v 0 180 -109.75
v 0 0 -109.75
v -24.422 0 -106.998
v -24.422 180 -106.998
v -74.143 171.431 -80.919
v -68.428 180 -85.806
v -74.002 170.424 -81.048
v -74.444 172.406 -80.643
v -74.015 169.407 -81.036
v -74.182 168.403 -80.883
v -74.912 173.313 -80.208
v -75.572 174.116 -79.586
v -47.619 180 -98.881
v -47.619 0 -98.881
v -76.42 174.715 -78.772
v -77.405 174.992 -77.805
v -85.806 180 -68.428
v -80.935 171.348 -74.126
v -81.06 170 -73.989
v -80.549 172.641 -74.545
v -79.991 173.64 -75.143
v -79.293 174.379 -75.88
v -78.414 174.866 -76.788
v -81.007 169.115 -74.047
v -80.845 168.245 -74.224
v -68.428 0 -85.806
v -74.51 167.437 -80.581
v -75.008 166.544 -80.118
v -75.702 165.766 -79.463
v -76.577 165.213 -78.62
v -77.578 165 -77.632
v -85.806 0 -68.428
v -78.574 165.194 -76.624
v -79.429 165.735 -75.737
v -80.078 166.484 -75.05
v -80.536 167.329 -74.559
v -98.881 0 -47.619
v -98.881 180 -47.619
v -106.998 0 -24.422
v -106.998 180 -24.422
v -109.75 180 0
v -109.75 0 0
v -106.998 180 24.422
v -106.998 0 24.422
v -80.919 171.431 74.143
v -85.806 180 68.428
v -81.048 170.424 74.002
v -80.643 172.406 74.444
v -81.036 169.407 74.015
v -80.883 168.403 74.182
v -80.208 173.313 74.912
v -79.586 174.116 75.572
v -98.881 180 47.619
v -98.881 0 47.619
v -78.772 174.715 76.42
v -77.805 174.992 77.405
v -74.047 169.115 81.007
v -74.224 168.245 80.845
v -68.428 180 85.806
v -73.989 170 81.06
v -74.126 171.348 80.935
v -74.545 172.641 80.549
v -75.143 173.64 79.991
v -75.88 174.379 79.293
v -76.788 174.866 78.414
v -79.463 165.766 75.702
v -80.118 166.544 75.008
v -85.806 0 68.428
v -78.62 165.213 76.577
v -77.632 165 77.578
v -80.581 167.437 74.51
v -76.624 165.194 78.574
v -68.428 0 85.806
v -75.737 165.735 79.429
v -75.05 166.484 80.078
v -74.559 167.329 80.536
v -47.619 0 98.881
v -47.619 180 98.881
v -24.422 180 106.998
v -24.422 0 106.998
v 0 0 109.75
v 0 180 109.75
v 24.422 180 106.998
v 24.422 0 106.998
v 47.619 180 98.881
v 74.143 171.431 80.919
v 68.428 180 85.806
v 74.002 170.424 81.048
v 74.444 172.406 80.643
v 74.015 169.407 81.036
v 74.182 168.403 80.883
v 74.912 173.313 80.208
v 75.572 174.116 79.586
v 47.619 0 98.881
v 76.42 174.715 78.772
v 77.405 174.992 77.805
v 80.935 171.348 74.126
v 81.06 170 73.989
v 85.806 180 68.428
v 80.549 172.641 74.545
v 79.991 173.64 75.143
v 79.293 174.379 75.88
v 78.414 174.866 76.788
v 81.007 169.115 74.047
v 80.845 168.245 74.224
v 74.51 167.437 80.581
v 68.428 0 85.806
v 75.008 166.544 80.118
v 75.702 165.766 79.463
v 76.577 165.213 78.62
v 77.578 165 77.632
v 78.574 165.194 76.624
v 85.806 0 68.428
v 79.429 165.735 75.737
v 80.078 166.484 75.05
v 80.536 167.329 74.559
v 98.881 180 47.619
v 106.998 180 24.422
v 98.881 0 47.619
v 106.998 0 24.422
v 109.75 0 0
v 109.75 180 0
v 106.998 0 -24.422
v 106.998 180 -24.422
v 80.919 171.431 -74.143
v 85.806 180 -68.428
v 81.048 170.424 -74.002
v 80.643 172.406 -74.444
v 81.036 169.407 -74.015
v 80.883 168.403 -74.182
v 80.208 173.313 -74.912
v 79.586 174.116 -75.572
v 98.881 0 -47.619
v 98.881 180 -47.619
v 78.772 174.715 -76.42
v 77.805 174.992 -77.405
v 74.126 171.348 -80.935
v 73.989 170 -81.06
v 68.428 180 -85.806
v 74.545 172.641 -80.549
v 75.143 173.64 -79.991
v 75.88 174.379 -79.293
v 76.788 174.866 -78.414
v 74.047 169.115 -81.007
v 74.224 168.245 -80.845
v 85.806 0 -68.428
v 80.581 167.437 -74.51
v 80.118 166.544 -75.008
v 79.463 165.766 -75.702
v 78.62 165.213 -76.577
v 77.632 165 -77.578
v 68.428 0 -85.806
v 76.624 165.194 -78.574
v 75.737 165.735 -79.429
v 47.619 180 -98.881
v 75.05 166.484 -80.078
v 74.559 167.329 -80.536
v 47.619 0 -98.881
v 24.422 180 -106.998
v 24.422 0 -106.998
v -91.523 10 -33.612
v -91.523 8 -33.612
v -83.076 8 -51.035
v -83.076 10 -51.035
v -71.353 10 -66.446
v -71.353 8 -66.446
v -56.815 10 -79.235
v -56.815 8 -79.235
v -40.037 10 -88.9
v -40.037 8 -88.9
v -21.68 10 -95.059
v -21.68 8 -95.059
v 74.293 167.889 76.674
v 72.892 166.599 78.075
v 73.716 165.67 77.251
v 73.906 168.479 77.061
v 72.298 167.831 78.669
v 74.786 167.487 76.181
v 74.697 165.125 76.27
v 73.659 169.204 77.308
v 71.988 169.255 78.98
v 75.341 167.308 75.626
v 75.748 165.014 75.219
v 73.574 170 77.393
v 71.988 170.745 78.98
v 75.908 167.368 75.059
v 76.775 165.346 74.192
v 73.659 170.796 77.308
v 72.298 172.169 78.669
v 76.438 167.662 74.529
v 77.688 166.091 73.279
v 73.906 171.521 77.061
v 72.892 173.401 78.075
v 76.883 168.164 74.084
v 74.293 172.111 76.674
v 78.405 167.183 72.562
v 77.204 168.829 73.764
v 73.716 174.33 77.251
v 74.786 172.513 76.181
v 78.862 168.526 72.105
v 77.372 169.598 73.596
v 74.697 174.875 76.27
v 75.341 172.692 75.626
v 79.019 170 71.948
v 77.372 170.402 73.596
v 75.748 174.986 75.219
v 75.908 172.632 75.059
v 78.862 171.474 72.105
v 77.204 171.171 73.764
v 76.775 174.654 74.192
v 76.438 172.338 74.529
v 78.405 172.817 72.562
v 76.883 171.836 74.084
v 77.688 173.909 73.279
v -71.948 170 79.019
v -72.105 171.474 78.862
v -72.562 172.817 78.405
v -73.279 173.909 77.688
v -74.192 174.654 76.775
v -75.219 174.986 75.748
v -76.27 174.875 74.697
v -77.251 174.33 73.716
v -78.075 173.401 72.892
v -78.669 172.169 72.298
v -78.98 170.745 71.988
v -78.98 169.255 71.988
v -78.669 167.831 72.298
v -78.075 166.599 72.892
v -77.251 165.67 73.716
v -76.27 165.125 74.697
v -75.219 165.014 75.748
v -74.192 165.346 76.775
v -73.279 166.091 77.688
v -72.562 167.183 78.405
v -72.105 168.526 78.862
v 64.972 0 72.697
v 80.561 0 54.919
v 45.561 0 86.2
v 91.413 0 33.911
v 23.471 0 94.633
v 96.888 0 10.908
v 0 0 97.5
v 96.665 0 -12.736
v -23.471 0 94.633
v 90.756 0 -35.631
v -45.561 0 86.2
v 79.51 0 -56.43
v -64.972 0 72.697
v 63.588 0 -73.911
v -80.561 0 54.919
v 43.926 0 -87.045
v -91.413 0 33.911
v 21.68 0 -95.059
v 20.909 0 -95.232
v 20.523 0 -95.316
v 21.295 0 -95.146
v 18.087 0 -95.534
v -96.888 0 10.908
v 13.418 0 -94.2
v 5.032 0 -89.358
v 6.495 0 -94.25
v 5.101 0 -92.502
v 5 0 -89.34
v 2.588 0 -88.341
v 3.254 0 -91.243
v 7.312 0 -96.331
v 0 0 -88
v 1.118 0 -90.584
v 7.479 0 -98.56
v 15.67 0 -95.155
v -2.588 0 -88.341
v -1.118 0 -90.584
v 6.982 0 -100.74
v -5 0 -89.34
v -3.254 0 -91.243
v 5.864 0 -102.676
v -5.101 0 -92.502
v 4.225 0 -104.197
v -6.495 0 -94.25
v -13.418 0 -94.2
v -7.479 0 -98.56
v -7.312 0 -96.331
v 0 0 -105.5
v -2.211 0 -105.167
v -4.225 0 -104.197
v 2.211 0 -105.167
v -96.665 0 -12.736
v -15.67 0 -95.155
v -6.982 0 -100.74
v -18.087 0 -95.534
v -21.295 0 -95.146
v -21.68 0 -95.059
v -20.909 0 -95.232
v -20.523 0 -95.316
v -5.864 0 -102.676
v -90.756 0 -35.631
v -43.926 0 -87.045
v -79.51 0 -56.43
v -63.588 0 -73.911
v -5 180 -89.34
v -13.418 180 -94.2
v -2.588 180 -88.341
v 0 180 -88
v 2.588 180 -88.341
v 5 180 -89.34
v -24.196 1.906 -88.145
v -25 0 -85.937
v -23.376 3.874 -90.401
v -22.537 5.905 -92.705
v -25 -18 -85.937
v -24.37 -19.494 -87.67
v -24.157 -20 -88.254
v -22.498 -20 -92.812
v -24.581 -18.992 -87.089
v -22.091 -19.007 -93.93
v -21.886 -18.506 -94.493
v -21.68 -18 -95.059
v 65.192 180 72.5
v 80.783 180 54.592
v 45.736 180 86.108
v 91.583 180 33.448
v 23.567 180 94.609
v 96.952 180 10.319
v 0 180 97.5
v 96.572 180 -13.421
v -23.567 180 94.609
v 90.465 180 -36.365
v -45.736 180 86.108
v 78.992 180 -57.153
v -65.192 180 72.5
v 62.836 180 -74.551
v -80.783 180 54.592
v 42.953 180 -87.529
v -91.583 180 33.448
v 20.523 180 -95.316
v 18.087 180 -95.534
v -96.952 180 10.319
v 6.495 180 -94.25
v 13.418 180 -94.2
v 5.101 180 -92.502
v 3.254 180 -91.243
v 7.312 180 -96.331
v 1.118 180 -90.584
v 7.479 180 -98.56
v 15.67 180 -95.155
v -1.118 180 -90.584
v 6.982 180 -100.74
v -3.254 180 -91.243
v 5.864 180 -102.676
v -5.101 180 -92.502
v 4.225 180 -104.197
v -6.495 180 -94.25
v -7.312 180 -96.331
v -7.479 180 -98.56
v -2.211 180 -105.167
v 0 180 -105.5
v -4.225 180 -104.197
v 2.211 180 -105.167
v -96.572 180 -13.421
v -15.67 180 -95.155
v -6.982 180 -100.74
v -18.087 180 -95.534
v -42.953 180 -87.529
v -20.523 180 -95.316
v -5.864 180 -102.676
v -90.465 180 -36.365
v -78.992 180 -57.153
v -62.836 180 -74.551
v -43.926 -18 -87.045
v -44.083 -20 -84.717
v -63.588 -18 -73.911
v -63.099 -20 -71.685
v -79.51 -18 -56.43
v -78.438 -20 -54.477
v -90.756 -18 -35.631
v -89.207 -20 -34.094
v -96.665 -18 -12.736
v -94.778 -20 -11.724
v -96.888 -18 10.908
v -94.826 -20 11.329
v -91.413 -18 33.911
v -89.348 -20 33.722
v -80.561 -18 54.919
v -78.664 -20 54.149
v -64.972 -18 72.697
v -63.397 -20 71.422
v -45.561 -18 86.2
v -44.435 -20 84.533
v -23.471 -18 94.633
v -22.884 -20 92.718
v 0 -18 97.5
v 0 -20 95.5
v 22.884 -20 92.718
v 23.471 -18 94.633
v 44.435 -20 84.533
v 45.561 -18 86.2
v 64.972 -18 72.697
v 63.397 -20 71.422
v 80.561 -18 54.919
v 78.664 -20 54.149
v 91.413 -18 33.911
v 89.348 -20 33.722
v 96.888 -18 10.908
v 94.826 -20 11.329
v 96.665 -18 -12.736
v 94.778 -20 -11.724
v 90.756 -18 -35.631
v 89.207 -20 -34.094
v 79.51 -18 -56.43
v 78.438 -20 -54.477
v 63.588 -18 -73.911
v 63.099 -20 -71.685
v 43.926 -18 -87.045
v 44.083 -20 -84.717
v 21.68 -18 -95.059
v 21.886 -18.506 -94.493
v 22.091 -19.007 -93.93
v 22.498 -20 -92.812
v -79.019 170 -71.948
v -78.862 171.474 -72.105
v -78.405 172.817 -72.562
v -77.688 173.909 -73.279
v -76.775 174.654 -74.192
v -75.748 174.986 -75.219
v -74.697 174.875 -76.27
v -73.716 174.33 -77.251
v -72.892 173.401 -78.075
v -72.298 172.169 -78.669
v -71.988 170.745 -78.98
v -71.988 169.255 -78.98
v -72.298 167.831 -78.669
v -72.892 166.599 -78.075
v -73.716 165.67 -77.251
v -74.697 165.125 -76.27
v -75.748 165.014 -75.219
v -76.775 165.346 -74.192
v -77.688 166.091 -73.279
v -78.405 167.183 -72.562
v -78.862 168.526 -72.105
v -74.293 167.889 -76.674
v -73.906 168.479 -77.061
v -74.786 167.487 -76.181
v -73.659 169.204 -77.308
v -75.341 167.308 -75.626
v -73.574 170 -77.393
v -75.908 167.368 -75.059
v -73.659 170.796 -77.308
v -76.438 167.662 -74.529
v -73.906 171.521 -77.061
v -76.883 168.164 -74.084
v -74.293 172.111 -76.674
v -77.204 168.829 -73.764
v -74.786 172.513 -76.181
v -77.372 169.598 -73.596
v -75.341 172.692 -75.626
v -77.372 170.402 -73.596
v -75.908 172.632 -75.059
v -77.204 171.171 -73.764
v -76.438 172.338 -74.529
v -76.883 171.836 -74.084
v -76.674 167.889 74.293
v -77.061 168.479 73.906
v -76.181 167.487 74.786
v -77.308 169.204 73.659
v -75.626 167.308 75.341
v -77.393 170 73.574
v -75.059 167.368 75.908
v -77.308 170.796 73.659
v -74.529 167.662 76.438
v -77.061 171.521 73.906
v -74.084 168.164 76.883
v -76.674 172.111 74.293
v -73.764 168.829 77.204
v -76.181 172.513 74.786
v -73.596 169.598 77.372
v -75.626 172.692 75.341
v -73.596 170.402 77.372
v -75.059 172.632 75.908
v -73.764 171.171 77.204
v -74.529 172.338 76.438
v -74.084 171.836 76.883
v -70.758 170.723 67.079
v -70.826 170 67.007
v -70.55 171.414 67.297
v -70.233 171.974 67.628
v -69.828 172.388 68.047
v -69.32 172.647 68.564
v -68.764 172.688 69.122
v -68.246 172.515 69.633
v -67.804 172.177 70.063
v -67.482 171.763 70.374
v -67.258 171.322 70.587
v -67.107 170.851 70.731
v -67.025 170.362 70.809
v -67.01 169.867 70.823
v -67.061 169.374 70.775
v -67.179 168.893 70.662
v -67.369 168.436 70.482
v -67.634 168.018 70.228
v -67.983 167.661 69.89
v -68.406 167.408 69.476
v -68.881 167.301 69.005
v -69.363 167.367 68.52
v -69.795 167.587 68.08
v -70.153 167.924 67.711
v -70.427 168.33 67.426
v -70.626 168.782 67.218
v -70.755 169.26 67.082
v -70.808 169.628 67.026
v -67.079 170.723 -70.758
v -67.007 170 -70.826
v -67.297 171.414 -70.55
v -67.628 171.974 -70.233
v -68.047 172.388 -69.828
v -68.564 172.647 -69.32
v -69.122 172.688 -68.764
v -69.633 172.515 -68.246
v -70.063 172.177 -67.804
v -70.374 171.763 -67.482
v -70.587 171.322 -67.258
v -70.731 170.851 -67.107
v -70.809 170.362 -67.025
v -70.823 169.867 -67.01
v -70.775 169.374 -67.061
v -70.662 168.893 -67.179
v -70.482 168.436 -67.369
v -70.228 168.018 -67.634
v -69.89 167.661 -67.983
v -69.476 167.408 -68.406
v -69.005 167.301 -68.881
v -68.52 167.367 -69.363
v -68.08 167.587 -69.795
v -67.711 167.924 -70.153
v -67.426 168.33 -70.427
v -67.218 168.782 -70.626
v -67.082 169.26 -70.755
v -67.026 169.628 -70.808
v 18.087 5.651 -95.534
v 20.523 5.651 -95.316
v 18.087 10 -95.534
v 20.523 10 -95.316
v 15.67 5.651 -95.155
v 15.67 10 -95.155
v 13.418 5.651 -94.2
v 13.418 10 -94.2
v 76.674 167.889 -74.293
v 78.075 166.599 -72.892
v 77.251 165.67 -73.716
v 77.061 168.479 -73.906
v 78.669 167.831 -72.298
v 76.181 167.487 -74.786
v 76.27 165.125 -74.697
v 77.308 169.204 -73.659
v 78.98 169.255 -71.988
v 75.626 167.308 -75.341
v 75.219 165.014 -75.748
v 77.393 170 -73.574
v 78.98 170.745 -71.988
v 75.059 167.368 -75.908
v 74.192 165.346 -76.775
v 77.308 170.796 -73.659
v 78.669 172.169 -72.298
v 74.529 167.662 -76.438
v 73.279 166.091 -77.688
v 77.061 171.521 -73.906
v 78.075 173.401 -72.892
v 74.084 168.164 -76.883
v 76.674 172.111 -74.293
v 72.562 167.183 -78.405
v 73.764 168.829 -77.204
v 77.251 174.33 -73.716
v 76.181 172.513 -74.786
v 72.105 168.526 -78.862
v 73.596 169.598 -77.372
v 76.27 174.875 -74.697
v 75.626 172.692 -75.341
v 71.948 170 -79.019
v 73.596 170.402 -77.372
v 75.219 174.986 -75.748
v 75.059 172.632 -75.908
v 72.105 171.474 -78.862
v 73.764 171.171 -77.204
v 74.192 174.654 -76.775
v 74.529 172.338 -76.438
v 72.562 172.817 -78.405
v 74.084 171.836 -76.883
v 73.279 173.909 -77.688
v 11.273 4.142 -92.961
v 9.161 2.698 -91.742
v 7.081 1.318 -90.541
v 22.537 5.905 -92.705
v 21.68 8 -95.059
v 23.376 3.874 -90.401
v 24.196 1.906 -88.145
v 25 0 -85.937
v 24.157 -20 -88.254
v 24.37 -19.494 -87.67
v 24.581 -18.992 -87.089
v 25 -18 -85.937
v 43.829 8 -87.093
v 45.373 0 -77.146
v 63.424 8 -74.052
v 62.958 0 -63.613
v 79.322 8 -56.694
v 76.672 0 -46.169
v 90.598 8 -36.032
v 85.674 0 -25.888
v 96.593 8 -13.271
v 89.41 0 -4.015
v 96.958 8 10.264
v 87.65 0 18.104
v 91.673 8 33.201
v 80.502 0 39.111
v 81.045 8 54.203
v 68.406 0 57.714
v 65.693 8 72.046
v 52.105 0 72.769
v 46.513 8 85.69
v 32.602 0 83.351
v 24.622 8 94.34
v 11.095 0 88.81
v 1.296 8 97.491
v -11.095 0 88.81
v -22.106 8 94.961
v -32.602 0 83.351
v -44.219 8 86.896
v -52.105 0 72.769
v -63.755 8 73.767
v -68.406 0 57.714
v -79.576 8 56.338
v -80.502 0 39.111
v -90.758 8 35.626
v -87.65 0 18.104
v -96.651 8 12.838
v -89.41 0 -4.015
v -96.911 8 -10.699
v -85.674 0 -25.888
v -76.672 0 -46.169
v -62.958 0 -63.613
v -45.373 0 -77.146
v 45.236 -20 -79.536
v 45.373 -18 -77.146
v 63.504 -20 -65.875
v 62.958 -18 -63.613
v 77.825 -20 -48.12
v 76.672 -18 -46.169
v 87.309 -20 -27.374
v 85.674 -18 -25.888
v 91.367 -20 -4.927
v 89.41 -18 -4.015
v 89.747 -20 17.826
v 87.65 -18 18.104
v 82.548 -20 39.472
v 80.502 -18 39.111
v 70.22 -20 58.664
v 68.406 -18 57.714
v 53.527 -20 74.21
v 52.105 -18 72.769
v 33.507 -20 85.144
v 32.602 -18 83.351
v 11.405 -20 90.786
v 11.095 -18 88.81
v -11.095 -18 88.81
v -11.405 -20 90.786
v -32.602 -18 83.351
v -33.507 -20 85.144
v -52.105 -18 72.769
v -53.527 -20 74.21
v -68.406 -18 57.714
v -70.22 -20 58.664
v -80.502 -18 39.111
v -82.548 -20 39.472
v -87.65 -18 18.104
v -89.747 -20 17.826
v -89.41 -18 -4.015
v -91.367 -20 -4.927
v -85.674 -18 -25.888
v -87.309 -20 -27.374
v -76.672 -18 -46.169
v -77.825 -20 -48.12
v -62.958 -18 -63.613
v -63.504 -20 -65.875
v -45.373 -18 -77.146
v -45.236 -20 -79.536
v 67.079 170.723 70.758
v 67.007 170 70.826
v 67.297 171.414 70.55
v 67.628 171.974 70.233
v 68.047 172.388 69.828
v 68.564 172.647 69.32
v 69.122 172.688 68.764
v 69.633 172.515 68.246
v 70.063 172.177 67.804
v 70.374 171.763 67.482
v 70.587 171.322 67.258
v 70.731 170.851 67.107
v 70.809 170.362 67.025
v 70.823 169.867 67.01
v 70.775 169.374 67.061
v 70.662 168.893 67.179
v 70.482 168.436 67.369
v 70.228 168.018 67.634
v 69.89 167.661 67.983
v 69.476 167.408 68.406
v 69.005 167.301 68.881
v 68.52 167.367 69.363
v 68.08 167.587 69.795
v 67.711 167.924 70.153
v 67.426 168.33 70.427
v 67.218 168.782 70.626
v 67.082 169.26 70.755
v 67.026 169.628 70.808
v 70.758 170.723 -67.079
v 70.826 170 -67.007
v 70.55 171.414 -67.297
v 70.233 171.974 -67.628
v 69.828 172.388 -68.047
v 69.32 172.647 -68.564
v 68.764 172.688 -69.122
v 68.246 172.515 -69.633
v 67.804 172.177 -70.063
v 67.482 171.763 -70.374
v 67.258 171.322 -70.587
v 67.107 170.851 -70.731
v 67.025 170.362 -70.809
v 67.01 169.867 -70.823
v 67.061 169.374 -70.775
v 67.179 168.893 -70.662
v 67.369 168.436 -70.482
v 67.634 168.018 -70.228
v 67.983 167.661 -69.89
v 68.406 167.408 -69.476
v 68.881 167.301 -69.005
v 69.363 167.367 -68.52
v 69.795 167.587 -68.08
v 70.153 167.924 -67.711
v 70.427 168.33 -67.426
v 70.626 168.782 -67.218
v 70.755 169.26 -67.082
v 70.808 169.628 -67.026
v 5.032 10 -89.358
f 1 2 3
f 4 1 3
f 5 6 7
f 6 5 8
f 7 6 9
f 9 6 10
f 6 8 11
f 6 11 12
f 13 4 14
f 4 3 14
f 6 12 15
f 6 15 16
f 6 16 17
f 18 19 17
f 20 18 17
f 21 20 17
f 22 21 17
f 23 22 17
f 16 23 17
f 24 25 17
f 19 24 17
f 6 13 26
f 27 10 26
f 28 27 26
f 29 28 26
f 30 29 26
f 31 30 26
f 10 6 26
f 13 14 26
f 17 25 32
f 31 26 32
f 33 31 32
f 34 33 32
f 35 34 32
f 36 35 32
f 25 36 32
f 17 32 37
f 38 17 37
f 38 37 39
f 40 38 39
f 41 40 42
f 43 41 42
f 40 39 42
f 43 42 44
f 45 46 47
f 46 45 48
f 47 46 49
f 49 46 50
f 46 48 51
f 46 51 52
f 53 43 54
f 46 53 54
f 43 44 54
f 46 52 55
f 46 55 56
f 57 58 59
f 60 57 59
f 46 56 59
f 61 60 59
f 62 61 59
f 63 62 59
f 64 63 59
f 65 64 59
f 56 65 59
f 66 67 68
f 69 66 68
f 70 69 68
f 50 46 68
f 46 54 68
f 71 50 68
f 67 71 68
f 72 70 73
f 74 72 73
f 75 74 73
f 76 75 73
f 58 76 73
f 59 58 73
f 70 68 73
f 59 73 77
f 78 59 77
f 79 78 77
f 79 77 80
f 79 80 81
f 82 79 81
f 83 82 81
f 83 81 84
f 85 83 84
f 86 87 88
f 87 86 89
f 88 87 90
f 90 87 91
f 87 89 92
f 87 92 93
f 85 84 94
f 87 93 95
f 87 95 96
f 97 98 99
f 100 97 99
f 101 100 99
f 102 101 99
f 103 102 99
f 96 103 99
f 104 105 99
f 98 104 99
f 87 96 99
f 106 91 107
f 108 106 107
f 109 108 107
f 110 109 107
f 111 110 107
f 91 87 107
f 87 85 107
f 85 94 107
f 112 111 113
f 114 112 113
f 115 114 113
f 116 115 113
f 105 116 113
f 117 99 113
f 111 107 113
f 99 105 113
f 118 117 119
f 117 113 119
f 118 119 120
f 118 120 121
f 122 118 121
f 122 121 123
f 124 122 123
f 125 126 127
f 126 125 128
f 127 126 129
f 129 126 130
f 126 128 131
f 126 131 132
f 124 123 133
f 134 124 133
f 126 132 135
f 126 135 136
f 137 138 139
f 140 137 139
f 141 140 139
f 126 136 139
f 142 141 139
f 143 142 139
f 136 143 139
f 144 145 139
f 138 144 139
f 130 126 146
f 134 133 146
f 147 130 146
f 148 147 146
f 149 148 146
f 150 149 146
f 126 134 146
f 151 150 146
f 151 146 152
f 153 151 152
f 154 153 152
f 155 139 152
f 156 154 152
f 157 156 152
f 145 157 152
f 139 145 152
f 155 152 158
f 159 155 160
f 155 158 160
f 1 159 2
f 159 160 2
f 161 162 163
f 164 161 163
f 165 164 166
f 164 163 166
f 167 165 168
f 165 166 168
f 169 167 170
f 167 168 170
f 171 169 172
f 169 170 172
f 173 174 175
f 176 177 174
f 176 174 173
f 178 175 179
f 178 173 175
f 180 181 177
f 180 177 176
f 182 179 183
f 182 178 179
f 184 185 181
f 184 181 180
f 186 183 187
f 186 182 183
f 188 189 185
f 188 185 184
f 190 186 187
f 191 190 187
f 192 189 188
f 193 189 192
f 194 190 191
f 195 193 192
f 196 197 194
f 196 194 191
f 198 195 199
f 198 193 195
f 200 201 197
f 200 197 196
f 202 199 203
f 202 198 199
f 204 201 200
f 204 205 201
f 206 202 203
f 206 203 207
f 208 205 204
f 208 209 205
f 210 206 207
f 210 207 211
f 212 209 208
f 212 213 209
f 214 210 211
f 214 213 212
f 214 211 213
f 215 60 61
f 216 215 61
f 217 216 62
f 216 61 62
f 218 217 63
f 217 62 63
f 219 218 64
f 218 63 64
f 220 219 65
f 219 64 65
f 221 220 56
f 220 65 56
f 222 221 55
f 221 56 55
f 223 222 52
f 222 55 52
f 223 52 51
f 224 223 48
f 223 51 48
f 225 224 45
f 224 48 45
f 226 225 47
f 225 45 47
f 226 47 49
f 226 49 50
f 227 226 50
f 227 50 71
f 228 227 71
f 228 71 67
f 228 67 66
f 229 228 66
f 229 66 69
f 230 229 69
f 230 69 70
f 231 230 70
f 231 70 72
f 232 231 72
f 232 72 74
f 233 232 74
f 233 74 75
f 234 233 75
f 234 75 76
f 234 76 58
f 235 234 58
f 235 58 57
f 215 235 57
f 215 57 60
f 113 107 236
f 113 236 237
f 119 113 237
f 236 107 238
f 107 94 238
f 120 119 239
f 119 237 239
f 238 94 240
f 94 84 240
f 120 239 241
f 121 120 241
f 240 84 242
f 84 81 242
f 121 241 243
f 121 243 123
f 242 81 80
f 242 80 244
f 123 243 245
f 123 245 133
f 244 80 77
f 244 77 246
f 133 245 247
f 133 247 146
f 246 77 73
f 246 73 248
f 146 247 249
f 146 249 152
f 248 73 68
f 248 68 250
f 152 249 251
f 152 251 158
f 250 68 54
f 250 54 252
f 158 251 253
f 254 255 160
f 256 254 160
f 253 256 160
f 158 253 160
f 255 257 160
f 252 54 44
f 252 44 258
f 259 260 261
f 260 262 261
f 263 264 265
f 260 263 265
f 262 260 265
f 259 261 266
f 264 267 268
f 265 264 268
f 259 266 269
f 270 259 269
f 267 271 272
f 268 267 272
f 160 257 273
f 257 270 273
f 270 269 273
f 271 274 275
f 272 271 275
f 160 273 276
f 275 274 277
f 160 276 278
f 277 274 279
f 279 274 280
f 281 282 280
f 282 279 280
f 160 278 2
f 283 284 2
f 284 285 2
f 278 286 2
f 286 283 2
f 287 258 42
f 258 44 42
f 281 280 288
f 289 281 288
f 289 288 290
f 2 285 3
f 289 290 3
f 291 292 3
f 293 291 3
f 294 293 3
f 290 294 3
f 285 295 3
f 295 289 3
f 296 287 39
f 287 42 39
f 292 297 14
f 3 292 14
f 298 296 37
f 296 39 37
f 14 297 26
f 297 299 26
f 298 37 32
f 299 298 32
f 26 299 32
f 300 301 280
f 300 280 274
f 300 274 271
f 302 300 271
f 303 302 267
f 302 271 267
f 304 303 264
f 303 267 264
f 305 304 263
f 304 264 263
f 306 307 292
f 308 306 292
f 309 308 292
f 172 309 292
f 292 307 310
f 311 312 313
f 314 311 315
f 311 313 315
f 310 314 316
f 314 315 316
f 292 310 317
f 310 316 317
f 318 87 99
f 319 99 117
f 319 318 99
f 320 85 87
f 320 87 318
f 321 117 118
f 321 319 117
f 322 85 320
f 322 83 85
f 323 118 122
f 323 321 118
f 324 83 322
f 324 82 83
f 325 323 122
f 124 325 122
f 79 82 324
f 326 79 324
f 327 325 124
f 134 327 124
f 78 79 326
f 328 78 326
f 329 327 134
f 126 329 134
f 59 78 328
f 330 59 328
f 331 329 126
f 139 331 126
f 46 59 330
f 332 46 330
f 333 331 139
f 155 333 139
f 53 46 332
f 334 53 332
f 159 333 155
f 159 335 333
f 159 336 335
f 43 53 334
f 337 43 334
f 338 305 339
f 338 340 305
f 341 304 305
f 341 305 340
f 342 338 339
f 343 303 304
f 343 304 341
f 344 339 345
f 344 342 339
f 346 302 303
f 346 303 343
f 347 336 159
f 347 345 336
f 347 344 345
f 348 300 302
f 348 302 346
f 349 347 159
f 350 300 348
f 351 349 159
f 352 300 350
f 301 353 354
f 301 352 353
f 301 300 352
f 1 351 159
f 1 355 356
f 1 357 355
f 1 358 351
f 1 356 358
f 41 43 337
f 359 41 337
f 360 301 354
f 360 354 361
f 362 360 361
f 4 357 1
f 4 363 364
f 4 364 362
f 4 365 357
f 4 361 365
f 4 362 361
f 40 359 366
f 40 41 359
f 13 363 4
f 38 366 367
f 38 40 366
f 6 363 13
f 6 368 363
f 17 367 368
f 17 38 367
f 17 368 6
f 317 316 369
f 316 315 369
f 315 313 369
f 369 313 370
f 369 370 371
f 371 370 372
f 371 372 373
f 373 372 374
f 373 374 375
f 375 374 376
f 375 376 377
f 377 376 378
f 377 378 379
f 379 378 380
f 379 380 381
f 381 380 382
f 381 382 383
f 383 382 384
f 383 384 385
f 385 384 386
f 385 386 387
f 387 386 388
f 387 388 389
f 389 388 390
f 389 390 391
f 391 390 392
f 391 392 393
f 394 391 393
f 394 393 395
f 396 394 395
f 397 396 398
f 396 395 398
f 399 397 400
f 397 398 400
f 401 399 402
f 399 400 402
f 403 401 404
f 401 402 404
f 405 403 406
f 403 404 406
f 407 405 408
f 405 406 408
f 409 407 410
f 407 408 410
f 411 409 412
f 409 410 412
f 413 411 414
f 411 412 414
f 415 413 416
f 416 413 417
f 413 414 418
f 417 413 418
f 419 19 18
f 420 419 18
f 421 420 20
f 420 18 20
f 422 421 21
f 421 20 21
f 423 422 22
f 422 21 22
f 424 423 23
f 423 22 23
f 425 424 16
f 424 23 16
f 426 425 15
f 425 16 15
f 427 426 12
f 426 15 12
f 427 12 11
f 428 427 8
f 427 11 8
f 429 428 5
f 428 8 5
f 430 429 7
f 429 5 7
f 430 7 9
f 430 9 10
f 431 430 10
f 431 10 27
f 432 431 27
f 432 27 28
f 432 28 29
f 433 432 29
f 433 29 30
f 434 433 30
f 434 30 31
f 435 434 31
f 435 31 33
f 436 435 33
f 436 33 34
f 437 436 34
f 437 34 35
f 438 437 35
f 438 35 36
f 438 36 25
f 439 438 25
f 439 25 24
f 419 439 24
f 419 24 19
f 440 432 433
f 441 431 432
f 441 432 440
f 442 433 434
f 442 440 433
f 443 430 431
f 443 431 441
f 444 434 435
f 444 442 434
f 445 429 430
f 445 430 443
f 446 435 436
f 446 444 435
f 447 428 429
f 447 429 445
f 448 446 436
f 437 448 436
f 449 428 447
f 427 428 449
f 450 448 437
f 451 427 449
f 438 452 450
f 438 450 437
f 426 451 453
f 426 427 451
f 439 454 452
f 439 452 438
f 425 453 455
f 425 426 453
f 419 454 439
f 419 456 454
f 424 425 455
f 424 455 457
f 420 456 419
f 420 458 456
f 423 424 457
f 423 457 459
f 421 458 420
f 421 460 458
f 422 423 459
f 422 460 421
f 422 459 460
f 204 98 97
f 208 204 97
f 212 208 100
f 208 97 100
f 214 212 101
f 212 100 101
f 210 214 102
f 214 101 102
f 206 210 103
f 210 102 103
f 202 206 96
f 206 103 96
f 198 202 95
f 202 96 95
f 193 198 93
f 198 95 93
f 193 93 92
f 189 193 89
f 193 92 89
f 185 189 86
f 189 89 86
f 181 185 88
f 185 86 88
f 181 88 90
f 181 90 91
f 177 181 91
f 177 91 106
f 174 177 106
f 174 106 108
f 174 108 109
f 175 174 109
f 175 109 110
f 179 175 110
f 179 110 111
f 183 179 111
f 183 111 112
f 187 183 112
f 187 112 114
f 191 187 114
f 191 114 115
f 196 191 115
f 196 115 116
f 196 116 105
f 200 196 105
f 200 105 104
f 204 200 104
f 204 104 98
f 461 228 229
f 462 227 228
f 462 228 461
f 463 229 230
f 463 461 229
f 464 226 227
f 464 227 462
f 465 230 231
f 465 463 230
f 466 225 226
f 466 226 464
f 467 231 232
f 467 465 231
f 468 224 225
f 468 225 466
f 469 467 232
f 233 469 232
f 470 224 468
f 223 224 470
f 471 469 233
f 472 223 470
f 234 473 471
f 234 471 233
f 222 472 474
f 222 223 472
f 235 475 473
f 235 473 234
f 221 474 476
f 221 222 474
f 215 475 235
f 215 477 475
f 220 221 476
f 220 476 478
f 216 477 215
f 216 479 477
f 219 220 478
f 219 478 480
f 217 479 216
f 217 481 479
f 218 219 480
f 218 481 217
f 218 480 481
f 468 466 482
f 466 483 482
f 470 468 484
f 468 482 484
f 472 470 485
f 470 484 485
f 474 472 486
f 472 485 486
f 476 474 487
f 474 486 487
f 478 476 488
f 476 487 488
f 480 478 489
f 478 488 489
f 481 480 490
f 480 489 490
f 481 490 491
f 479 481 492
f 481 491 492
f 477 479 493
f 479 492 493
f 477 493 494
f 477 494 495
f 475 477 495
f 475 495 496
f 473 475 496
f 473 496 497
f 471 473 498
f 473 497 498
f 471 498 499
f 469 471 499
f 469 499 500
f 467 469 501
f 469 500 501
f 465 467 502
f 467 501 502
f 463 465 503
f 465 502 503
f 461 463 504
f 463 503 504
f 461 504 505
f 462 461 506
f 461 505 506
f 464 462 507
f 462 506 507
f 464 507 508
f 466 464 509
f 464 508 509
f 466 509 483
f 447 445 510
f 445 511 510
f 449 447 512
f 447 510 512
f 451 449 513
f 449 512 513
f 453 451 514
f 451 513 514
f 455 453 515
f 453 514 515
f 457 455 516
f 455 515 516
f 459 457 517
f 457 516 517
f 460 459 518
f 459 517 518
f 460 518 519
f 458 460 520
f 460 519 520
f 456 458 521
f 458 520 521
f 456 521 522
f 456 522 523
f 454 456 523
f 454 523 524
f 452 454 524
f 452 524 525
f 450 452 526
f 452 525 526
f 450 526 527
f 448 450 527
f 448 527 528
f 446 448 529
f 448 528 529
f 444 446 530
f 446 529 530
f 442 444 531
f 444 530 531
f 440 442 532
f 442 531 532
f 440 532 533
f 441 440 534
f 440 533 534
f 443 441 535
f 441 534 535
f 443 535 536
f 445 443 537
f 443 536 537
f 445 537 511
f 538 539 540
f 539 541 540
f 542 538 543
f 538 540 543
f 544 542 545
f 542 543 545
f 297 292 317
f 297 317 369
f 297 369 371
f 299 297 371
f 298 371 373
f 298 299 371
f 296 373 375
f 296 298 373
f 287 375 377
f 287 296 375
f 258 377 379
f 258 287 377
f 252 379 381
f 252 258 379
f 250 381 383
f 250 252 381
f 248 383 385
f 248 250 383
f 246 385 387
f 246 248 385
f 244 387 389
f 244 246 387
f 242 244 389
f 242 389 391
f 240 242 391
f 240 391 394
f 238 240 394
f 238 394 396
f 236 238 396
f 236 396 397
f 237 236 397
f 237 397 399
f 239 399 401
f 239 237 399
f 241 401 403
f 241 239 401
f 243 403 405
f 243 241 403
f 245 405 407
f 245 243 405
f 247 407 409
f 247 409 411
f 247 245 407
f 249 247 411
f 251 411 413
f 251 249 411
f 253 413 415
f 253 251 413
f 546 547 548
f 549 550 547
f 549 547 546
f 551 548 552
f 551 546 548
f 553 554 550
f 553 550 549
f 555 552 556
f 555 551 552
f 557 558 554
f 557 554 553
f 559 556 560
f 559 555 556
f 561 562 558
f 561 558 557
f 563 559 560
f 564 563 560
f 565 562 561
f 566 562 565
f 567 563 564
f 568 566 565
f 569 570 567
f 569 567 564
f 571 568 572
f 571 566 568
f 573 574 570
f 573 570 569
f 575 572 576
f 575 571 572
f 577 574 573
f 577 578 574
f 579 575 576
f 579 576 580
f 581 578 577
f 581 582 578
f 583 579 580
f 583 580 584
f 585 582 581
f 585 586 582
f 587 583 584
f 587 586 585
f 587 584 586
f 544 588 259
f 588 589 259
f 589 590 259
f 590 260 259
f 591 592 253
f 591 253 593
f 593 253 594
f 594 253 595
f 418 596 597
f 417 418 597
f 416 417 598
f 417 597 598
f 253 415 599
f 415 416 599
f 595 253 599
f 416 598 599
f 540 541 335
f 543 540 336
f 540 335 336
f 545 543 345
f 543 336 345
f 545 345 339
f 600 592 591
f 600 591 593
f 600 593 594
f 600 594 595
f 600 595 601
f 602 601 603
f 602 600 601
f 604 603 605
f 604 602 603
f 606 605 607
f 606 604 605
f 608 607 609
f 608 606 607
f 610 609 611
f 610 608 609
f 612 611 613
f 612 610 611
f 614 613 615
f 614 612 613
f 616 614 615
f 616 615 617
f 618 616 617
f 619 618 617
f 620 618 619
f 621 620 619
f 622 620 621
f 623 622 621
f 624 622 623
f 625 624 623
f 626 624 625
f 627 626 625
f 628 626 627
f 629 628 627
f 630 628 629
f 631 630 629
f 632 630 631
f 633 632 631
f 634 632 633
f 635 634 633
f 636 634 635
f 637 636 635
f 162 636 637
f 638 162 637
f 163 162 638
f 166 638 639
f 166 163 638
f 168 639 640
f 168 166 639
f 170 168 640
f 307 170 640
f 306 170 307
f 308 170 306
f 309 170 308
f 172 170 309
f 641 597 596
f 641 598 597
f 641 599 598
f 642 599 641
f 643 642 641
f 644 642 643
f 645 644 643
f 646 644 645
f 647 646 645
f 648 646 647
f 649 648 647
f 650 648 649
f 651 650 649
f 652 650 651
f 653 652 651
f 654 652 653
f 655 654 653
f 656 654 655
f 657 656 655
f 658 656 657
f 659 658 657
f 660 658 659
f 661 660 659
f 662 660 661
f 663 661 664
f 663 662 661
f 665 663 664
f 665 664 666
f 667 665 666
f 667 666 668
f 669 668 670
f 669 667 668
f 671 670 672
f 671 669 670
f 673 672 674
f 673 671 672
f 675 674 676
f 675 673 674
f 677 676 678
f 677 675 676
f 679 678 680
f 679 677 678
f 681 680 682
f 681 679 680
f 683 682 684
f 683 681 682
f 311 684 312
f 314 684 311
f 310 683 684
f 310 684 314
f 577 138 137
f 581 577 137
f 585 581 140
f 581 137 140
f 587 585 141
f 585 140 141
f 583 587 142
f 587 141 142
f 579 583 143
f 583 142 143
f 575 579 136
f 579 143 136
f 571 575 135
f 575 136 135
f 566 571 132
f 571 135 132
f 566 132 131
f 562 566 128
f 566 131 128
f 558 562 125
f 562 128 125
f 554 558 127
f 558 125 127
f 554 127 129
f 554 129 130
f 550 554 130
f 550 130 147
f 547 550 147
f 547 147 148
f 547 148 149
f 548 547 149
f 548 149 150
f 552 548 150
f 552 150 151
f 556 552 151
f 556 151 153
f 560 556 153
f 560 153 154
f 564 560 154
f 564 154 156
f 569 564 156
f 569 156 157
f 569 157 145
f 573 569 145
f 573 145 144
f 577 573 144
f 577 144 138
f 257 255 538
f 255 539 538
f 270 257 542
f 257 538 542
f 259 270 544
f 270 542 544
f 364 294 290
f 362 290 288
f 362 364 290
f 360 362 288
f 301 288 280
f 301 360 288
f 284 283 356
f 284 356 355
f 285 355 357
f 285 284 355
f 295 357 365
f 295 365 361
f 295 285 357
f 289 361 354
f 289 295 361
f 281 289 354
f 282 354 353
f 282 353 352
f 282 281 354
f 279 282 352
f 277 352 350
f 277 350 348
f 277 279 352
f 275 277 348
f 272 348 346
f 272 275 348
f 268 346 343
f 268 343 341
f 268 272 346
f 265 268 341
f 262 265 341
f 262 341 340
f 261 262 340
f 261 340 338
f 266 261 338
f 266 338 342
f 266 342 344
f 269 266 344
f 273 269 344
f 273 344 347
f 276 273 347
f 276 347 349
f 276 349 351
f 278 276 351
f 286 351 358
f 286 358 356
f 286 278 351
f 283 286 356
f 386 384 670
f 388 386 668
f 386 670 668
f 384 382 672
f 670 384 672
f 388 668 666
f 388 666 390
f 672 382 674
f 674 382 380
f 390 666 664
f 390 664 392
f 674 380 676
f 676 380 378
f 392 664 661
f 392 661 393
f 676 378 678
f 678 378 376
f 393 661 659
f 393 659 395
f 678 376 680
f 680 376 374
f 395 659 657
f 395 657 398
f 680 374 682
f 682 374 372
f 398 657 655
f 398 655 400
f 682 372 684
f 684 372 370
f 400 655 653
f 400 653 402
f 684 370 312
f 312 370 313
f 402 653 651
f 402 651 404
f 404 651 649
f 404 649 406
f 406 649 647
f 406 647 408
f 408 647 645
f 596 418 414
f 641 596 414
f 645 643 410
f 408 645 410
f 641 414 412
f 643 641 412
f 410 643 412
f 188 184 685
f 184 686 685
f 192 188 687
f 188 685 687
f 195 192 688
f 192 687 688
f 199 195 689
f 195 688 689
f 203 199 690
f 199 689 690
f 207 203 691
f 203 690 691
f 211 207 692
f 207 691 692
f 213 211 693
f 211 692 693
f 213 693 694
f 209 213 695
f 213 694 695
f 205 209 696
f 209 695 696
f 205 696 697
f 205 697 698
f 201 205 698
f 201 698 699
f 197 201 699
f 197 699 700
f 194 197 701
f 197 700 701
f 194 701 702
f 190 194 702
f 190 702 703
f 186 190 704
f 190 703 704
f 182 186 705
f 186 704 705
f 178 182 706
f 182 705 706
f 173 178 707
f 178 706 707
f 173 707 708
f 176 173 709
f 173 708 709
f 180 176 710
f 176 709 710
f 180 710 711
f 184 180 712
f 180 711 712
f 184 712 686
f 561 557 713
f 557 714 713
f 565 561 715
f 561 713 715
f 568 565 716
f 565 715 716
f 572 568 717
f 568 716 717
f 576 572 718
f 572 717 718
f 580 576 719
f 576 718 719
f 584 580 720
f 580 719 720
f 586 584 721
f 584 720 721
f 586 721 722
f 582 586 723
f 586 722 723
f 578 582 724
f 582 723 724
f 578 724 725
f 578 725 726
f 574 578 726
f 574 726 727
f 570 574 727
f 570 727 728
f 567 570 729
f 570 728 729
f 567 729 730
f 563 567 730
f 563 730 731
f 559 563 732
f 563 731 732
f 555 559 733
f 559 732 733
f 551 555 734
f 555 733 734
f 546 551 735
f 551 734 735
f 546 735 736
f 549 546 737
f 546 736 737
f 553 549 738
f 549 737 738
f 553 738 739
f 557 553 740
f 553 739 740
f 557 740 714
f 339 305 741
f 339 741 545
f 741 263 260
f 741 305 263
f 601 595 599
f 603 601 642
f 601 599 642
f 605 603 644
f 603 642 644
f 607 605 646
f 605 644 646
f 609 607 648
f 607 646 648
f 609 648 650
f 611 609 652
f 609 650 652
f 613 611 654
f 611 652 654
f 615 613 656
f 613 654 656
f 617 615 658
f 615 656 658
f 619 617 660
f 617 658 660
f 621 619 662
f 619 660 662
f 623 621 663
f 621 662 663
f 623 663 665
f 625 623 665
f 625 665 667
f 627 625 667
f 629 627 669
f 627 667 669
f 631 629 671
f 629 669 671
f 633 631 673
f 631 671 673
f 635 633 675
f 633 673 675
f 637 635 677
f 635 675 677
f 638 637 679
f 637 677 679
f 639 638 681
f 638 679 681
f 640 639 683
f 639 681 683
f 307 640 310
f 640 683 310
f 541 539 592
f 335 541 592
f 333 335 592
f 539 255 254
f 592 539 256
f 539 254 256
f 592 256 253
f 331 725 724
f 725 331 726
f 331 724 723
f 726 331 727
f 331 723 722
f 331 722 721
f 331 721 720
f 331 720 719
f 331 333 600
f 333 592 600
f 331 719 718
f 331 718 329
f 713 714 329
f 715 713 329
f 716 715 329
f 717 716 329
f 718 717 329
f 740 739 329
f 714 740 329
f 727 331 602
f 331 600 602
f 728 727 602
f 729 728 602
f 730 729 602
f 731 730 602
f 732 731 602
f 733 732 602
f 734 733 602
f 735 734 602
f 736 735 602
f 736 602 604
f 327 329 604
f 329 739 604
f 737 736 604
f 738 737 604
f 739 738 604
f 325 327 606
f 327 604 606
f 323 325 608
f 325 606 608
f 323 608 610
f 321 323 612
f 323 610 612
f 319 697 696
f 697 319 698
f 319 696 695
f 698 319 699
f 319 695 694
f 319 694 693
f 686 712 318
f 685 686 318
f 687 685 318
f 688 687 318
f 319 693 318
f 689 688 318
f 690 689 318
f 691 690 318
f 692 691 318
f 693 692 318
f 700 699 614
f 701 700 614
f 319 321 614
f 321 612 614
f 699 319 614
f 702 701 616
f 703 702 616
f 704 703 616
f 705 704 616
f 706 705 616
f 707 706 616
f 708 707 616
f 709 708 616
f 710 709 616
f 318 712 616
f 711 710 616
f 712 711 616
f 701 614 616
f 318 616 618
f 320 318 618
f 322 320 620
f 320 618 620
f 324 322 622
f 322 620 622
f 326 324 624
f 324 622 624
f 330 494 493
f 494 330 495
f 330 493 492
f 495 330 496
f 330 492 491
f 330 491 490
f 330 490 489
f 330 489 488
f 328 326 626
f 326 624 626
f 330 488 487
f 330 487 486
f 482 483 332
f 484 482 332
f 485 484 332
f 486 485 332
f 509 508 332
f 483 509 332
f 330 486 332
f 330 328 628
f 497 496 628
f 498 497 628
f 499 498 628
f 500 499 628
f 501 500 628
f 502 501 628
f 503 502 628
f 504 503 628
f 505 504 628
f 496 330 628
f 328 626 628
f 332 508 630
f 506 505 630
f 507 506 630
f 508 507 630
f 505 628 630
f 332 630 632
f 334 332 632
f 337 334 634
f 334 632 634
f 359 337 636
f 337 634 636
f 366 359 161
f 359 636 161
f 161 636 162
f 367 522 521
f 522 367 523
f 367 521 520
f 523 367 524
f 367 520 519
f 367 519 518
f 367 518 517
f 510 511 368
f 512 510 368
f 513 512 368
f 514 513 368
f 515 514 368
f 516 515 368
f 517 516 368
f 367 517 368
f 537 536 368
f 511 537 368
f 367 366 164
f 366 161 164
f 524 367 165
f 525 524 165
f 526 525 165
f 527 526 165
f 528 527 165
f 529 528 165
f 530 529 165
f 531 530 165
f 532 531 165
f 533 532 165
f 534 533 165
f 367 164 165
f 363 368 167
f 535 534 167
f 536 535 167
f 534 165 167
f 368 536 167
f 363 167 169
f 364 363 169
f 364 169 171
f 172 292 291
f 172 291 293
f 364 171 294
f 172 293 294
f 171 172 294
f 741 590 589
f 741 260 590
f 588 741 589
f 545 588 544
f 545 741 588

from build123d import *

# Parameters (mm, degrees)
SCHIZZO1_R                                           = 109.75
SCHIZZO1_R_2                                         = 7.5
ESTRUSIONE_ESTRUSIONE1_DEPTH                         = 180
FORO_LAMATO_PER_BULLONE_M5_A_TESTA_ESAGO_D           = 5.4
FORO_LAMATO_PER_BULLONE_M5_A_TESTA_ESAGO_DEPTH       = 20
FORO_LAMATO_PER_BULLONE_M5_A_TESTA_ESAGO_CBORE_D     = 10
FORO_LAMATO_PER_BULLONE_M5_A_TESTA_ESAGO_CBORE_DEPTH = 3
FORO_LAMATO_PER_BULLONE_M5_A_TESTA_ESAGO_TIP         = 1.622323671
FORO_LAMATO_PER_BULLONE_M5_A_TESTA_E_2_D             = 5.4
FORO_LAMATO_PER_BULLONE_M5_A_TESTA_E_2_DEPTH         = 20
FORO_LAMATO_PER_BULLONE_M5_A_TESTA_E_2_CBORE_D       = 10
FORO_LAMATO_PER_BULLONE_M5_A_TESTA_E_2_CBORE_DEPTH   = 3
FORO_LAMATO_PER_BULLONE_M5_A_TESTA_E_2_TIP           = 1.622323671
FORO_LAMATO_PER_BULLONE_M5_A_TESTA_E_3_D             = 5.4
FORO_LAMATO_PER_BULLONE_M5_A_TESTA_E_3_DEPTH         = 20
FORO_LAMATO_PER_BULLONE_M5_A_TESTA_E_3_CBORE_D       = 10
FORO_LAMATO_PER_BULLONE_M5_A_TESTA_E_3_CBORE_DEPTH   = 3
FORO_LAMATO_PER_BULLONE_M5_A_TESTA_E_3_TIP           = 1.622323671
FORO_LAMATO_PER_BULLONE_M5_A_TESTA_E_4_D             = 5.4
FORO_LAMATO_PER_BULLONE_M5_A_TESTA_E_4_DEPTH         = 20
FORO_LAMATO_PER_BULLONE_M5_A_TESTA_E_4_CBORE_D       = 10
FORO_LAMATO_PER_BULLONE_M5_A_TESTA_E_4_CBORE_DEPTH   = 3
FORO_LAMATO_PER_BULLONE_M5_A_TESTA_E_4_TIP           = 1.622323671
ESTRUSIONE_ESTRUSIONE2_DEPTH                         = 20
ESTRUSIONE_ESTRUSIONE3_DEPTH                         = 10
SMUSSO1_SIZE                                         = 10
RACCORDO1_R                                          = 10
SMUSSO2_SIZE                                         = 2


with BuildPart() as part:
    # Schizzo1 → Estrusione-Estrusione1 (new body)
    with BuildSketch(Plane(origin=(0, 0, 0), x_dir=(1, 0, 0), z_dir=(0, 1, 0))):
        with Locations(Location((0, 0, 0), (0, 0, 90))):
            Circle(SCHIZZO1_R)
        with Locations(Location((0, 98, 0), (0, 0, 90))):
            Circle(SCHIZZO1_R_2, mode=Mode.SUBTRACT)
        with BuildLine():
            Line((-16.652598983, 96.067377122), (-5, 89.339745962))
            ThreePointArc((-5, 89.339745962), (0, 88), (5, 89.339745962))
            Line((5, 89.339745962), (16.652598983, 96.067377122))
            ThreePointArc((16.652598983, 96.067377122), (0, -97.5), (-16.652598983, 96.067377122))
        make_face(mode=Mode.SUBTRACT)
    extrude(amount=ESTRUSIONE_ESTRUSIONE1_DEPTH)

    # Foro lamato per Bullone M5 a testa esagonale-1
    with Locations(Plane(origin=(-77.604969235, 170, -77.604969235), x_dir=(-0.707106781187, 0, 0.707106781187), z_dir=(-0.707106781187, 0, -0.707106781187))):
        with Locations((0, 0)):
            CounterBoreHole(FORO_LAMATO_PER_BULLONE_M5_A_TESTA_ESAGO_D / 2, FORO_LAMATO_PER_BULLONE_M5_A_TESTA_ESAGO_CBORE_D / 2, FORO_LAMATO_PER_BULLONE_M5_A_TESTA_ESAGO_CBORE_DEPTH, depth=FORO_LAMATO_PER_BULLONE_M5_A_TESTA_ESAGO_DEPTH)
            with Locations((0, 0, -(FORO_LAMATO_PER_BULLONE_M5_A_TESTA_ESAGO_DEPTH + FORO_LAMATO_PER_BULLONE_M5_A_TESTA_ESAGO_TIP / 2))):  # 118° drill point
                Cone(0, FORO_LAMATO_PER_BULLONE_M5_A_TESTA_ESAGO_D / 2, FORO_LAMATO_PER_BULLONE_M5_A_TESTA_ESAGO_TIP, mode=Mode.SUBTRACT)

    # Foro lamato per Bullone M5 a testa e 2
    with Locations(Plane(origin=(-77.604969235, 170, 77.604969235), x_dir=(0.707106781187, 0, 0.707106781187), z_dir=(-0.707106781187, 0, 0.707106781187))):
        with Locations((0, 0)):
            CounterBoreHole(FORO_LAMATO_PER_BULLONE_M5_A_TESTA_E_2_D / 2, FORO_LAMATO_PER_BULLONE_M5_A_TESTA_E_2_CBORE_D / 2, FORO_LAMATO_PER_BULLONE_M5_A_TESTA_E_2_CBORE_DEPTH, depth=FORO_LAMATO_PER_BULLONE_M5_A_TESTA_E_2_DEPTH)
            with Locations((0, 0, -(FORO_LAMATO_PER_BULLONE_M5_A_TESTA_E_2_DEPTH + FORO_LAMATO_PER_BULLONE_M5_A_TESTA_E_2_TIP / 2))):  # 118° drill point
                Cone(0, FORO_LAMATO_PER_BULLONE_M5_A_TESTA_E_2_D / 2, FORO_LAMATO_PER_BULLONE_M5_A_TESTA_E_2_TIP, mode=Mode.SUBTRACT)

    # Foro lamato per Bullone M5 a testa e 3
    with Locations(Plane(origin=(77.604969235, 170, -77.604969235), x_dir=(-0.707106781187, 0, -0.707106781187), z_dir=(0.707106781187, 0, -0.707106781187))):
        with Locations((0, 0)):
            CounterBoreHole(FORO_LAMATO_PER_BULLONE_M5_A_TESTA_E_3_D / 2, FORO_LAMATO_PER_BULLONE_M5_A_TESTA_E_3_CBORE_D / 2, FORO_LAMATO_PER_BULLONE_M5_A_TESTA_E_3_CBORE_DEPTH, depth=FORO_LAMATO_PER_BULLONE_M5_A_TESTA_E_3_DEPTH)
            with Locations((0, 0, -(FORO_LAMATO_PER_BULLONE_M5_A_TESTA_E_3_DEPTH + FORO_LAMATO_PER_BULLONE_M5_A_TESTA_E_3_TIP / 2))):  # 118° drill point
                Cone(0, FORO_LAMATO_PER_BULLONE_M5_A_TESTA_E_3_D / 2, FORO_LAMATO_PER_BULLONE_M5_A_TESTA_E_3_TIP, mode=Mode.SUBTRACT)

    # Foro lamato per Bullone M5 a testa e 4
    with Locations(Plane(origin=(77.604969235, 170, 77.604969235), x_dir=(0.707106781187, 0, -0.707106781187), z_dir=(0.707106781187, 0, 0.707106781187))):
        with Locations((0, 0)):
            CounterBoreHole(FORO_LAMATO_PER_BULLONE_M5_A_TESTA_E_4_D / 2, FORO_LAMATO_PER_BULLONE_M5_A_TESTA_E_4_CBORE_D / 2, FORO_LAMATO_PER_BULLONE_M5_A_TESTA_E_4_CBORE_DEPTH, depth=FORO_LAMATO_PER_BULLONE_M5_A_TESTA_E_4_DEPTH)
            with Locations((0, 0, -(FORO_LAMATO_PER_BULLONE_M5_A_TESTA_E_4_DEPTH + FORO_LAMATO_PER_BULLONE_M5_A_TESTA_E_4_TIP / 2))):  # 118° drill point
                Cone(0, FORO_LAMATO_PER_BULLONE_M5_A_TESTA_E_4_D / 2, FORO_LAMATO_PER_BULLONE_M5_A_TESTA_E_4_TIP, mode=Mode.SUBTRACT)



with BuildPart() as body_2:
    # Schizzo1<4> → Estrusione-Estrusione2 (new body)
    with BuildSketch(Plane(origin=(0, 0, 0), x_dir=(1, 0, 0), z_dir=(0, 1, 0))):
        with BuildLine():
            Line((-25, 85.937477273), (-21.68001113, 95.059071726))
            ThreePointArc((-21.68001113, 95.059071726), (0, -97.5), (21.68001113, 95.059071726))
            Line((21.68001113, 95.059071726), (25, 85.937477273))
            ThreePointArc((25, 85.937477273), (0, -89.5), (-25, 85.937477273))
        make_face()
    extrude(amount=-ESTRUSIONE_ESTRUSIONE2_DEPTH)


with BuildPart() as part_1:
    add(part.part)

    add(body_2.part)  # Estrusione-Estrusione3 merges body 2
    # Schizzo1<5> → Estrusione-Estrusione3 (add)
    with BuildSketch(Plane(origin=(0, 0, 0), x_dir=(1, 0, 0), z_dir=(0, 1, 0))):
        with BuildLine():
            Line((-25, 85.937477273), (-21.68001113, 95.059071726))
            ThreePointArc((-21.68001113, 95.059071726), (0, -97.5), (21.68001113, 95.059071726))
            Line((21.68001113, 95.059071726), (25, 85.937477273))
            ThreePointArc((25, 85.937477273), (0, -89.5), (-25, 85.937477273))
        make_face()
    extrude(amount=ESTRUSIONE_ESTRUSIONE3_DEPTH)

    # Smusso1
    # the kernel refuses this chamfer: 10 mm, written as the material it takes off along each edge
    with BuildSketch(Plane(origin=(0, 10, 0), x_dir=(0.0031415874858797023, 0, -0.9999950652018582), z_dir=(-0.9999950652018582, 0, -0.0031415874858797023))) as smusso1_piece_1_section:
        Polygon((89.5, SMUSSO1_SIZE), (89.5 + SMUSSO1_SIZE, 0), (89.5, 0), align=None)
    smusso1_piece_1 = revolve(axis=Axis((0, 10, 0), (0, -1, 0)), revolution_arc=359.64, mode=Mode.PRIVATE)
    smusso1_piece_1 = smusso1_piece_1 & Plane(origin=(0, 6.636633225, 0), x_dir=(0.17079588700932372, 0, -0.9853064320203632), z_dir=(0, -1, 0)) * Cylinder(97.5, 399, mode=Mode.PRIVATE)
    smusso1_piece_1 = split(smusso1_piece_1, bisect_by=Plane(origin=(35.757086514, 6.636633225, -107.09735814), z_dir=(0.5000000000000053, 0, 0.8660254037844358)), keep=Keep.TOP, mode=Mode.PRIVATE)
    add(smusso1_piece_1, mode=Mode.SUBTRACT)
    with BuildSketch(Plane(origin=(0, 10, 0), x_dir=(0.0031415874858797023, 0, -0.9999950652018582), z_dir=(-0.9999950652018582, 0, -0.0031415874858797023))) as smusso1_piece_2_section:
        Polygon((89.5, SMUSSO1_SIZE), (89.5 + SMUSSO1_SIZE, 0), (89.5, 0), align=None)
    smusso1_piece_2 = revolve(axis=Axis((0, 10, 0), (0, -1, 0)), revolution_arc=359.64, mode=Mode.PRIVATE)
    smusso1_piece_2 = smusso1_piece_2 & Plane(origin=(0, 6.636633226, 0), x_dir=(0.17079588700932372, 0, -0.9853064320203632), z_dir=(0, -1, 0)) * Cylinder(97.5, 399, mode=Mode.PRIVATE)
    smusso1_piece_2 = split(smusso1_piece_2, bisect_by=Plane(origin=(-34.569971333, 6.636633226, -59.64419713), z_dir=(-0.9396926207859074, 0, -0.3420201433256714)), keep=Keep.TOP, mode=Mode.PRIVATE)
    add(smusso1_piece_2, mode=Mode.SUBTRACT)

    # Raccordo1
    raccordo1_edges = [part_1.edges().sort_by_distance(p)[0] for p in [
        (-16.652598983, 90, -96.067377122),
        (16.652598983, 90, -96.067377122),
    ]]
    fillet(raccordo1_edges, radius=RACCORDO1_R)

    # Smusso2
    smusso2_edges = [part_1.edges().sort_by_distance(p)[0] for p in [
        (0, -20, 97.5),
        (0, -20, 89.5),
    ]]
    chamfer(smusso2_edges, length=SMUSSO2_SIZE)


solid = part_1.part
